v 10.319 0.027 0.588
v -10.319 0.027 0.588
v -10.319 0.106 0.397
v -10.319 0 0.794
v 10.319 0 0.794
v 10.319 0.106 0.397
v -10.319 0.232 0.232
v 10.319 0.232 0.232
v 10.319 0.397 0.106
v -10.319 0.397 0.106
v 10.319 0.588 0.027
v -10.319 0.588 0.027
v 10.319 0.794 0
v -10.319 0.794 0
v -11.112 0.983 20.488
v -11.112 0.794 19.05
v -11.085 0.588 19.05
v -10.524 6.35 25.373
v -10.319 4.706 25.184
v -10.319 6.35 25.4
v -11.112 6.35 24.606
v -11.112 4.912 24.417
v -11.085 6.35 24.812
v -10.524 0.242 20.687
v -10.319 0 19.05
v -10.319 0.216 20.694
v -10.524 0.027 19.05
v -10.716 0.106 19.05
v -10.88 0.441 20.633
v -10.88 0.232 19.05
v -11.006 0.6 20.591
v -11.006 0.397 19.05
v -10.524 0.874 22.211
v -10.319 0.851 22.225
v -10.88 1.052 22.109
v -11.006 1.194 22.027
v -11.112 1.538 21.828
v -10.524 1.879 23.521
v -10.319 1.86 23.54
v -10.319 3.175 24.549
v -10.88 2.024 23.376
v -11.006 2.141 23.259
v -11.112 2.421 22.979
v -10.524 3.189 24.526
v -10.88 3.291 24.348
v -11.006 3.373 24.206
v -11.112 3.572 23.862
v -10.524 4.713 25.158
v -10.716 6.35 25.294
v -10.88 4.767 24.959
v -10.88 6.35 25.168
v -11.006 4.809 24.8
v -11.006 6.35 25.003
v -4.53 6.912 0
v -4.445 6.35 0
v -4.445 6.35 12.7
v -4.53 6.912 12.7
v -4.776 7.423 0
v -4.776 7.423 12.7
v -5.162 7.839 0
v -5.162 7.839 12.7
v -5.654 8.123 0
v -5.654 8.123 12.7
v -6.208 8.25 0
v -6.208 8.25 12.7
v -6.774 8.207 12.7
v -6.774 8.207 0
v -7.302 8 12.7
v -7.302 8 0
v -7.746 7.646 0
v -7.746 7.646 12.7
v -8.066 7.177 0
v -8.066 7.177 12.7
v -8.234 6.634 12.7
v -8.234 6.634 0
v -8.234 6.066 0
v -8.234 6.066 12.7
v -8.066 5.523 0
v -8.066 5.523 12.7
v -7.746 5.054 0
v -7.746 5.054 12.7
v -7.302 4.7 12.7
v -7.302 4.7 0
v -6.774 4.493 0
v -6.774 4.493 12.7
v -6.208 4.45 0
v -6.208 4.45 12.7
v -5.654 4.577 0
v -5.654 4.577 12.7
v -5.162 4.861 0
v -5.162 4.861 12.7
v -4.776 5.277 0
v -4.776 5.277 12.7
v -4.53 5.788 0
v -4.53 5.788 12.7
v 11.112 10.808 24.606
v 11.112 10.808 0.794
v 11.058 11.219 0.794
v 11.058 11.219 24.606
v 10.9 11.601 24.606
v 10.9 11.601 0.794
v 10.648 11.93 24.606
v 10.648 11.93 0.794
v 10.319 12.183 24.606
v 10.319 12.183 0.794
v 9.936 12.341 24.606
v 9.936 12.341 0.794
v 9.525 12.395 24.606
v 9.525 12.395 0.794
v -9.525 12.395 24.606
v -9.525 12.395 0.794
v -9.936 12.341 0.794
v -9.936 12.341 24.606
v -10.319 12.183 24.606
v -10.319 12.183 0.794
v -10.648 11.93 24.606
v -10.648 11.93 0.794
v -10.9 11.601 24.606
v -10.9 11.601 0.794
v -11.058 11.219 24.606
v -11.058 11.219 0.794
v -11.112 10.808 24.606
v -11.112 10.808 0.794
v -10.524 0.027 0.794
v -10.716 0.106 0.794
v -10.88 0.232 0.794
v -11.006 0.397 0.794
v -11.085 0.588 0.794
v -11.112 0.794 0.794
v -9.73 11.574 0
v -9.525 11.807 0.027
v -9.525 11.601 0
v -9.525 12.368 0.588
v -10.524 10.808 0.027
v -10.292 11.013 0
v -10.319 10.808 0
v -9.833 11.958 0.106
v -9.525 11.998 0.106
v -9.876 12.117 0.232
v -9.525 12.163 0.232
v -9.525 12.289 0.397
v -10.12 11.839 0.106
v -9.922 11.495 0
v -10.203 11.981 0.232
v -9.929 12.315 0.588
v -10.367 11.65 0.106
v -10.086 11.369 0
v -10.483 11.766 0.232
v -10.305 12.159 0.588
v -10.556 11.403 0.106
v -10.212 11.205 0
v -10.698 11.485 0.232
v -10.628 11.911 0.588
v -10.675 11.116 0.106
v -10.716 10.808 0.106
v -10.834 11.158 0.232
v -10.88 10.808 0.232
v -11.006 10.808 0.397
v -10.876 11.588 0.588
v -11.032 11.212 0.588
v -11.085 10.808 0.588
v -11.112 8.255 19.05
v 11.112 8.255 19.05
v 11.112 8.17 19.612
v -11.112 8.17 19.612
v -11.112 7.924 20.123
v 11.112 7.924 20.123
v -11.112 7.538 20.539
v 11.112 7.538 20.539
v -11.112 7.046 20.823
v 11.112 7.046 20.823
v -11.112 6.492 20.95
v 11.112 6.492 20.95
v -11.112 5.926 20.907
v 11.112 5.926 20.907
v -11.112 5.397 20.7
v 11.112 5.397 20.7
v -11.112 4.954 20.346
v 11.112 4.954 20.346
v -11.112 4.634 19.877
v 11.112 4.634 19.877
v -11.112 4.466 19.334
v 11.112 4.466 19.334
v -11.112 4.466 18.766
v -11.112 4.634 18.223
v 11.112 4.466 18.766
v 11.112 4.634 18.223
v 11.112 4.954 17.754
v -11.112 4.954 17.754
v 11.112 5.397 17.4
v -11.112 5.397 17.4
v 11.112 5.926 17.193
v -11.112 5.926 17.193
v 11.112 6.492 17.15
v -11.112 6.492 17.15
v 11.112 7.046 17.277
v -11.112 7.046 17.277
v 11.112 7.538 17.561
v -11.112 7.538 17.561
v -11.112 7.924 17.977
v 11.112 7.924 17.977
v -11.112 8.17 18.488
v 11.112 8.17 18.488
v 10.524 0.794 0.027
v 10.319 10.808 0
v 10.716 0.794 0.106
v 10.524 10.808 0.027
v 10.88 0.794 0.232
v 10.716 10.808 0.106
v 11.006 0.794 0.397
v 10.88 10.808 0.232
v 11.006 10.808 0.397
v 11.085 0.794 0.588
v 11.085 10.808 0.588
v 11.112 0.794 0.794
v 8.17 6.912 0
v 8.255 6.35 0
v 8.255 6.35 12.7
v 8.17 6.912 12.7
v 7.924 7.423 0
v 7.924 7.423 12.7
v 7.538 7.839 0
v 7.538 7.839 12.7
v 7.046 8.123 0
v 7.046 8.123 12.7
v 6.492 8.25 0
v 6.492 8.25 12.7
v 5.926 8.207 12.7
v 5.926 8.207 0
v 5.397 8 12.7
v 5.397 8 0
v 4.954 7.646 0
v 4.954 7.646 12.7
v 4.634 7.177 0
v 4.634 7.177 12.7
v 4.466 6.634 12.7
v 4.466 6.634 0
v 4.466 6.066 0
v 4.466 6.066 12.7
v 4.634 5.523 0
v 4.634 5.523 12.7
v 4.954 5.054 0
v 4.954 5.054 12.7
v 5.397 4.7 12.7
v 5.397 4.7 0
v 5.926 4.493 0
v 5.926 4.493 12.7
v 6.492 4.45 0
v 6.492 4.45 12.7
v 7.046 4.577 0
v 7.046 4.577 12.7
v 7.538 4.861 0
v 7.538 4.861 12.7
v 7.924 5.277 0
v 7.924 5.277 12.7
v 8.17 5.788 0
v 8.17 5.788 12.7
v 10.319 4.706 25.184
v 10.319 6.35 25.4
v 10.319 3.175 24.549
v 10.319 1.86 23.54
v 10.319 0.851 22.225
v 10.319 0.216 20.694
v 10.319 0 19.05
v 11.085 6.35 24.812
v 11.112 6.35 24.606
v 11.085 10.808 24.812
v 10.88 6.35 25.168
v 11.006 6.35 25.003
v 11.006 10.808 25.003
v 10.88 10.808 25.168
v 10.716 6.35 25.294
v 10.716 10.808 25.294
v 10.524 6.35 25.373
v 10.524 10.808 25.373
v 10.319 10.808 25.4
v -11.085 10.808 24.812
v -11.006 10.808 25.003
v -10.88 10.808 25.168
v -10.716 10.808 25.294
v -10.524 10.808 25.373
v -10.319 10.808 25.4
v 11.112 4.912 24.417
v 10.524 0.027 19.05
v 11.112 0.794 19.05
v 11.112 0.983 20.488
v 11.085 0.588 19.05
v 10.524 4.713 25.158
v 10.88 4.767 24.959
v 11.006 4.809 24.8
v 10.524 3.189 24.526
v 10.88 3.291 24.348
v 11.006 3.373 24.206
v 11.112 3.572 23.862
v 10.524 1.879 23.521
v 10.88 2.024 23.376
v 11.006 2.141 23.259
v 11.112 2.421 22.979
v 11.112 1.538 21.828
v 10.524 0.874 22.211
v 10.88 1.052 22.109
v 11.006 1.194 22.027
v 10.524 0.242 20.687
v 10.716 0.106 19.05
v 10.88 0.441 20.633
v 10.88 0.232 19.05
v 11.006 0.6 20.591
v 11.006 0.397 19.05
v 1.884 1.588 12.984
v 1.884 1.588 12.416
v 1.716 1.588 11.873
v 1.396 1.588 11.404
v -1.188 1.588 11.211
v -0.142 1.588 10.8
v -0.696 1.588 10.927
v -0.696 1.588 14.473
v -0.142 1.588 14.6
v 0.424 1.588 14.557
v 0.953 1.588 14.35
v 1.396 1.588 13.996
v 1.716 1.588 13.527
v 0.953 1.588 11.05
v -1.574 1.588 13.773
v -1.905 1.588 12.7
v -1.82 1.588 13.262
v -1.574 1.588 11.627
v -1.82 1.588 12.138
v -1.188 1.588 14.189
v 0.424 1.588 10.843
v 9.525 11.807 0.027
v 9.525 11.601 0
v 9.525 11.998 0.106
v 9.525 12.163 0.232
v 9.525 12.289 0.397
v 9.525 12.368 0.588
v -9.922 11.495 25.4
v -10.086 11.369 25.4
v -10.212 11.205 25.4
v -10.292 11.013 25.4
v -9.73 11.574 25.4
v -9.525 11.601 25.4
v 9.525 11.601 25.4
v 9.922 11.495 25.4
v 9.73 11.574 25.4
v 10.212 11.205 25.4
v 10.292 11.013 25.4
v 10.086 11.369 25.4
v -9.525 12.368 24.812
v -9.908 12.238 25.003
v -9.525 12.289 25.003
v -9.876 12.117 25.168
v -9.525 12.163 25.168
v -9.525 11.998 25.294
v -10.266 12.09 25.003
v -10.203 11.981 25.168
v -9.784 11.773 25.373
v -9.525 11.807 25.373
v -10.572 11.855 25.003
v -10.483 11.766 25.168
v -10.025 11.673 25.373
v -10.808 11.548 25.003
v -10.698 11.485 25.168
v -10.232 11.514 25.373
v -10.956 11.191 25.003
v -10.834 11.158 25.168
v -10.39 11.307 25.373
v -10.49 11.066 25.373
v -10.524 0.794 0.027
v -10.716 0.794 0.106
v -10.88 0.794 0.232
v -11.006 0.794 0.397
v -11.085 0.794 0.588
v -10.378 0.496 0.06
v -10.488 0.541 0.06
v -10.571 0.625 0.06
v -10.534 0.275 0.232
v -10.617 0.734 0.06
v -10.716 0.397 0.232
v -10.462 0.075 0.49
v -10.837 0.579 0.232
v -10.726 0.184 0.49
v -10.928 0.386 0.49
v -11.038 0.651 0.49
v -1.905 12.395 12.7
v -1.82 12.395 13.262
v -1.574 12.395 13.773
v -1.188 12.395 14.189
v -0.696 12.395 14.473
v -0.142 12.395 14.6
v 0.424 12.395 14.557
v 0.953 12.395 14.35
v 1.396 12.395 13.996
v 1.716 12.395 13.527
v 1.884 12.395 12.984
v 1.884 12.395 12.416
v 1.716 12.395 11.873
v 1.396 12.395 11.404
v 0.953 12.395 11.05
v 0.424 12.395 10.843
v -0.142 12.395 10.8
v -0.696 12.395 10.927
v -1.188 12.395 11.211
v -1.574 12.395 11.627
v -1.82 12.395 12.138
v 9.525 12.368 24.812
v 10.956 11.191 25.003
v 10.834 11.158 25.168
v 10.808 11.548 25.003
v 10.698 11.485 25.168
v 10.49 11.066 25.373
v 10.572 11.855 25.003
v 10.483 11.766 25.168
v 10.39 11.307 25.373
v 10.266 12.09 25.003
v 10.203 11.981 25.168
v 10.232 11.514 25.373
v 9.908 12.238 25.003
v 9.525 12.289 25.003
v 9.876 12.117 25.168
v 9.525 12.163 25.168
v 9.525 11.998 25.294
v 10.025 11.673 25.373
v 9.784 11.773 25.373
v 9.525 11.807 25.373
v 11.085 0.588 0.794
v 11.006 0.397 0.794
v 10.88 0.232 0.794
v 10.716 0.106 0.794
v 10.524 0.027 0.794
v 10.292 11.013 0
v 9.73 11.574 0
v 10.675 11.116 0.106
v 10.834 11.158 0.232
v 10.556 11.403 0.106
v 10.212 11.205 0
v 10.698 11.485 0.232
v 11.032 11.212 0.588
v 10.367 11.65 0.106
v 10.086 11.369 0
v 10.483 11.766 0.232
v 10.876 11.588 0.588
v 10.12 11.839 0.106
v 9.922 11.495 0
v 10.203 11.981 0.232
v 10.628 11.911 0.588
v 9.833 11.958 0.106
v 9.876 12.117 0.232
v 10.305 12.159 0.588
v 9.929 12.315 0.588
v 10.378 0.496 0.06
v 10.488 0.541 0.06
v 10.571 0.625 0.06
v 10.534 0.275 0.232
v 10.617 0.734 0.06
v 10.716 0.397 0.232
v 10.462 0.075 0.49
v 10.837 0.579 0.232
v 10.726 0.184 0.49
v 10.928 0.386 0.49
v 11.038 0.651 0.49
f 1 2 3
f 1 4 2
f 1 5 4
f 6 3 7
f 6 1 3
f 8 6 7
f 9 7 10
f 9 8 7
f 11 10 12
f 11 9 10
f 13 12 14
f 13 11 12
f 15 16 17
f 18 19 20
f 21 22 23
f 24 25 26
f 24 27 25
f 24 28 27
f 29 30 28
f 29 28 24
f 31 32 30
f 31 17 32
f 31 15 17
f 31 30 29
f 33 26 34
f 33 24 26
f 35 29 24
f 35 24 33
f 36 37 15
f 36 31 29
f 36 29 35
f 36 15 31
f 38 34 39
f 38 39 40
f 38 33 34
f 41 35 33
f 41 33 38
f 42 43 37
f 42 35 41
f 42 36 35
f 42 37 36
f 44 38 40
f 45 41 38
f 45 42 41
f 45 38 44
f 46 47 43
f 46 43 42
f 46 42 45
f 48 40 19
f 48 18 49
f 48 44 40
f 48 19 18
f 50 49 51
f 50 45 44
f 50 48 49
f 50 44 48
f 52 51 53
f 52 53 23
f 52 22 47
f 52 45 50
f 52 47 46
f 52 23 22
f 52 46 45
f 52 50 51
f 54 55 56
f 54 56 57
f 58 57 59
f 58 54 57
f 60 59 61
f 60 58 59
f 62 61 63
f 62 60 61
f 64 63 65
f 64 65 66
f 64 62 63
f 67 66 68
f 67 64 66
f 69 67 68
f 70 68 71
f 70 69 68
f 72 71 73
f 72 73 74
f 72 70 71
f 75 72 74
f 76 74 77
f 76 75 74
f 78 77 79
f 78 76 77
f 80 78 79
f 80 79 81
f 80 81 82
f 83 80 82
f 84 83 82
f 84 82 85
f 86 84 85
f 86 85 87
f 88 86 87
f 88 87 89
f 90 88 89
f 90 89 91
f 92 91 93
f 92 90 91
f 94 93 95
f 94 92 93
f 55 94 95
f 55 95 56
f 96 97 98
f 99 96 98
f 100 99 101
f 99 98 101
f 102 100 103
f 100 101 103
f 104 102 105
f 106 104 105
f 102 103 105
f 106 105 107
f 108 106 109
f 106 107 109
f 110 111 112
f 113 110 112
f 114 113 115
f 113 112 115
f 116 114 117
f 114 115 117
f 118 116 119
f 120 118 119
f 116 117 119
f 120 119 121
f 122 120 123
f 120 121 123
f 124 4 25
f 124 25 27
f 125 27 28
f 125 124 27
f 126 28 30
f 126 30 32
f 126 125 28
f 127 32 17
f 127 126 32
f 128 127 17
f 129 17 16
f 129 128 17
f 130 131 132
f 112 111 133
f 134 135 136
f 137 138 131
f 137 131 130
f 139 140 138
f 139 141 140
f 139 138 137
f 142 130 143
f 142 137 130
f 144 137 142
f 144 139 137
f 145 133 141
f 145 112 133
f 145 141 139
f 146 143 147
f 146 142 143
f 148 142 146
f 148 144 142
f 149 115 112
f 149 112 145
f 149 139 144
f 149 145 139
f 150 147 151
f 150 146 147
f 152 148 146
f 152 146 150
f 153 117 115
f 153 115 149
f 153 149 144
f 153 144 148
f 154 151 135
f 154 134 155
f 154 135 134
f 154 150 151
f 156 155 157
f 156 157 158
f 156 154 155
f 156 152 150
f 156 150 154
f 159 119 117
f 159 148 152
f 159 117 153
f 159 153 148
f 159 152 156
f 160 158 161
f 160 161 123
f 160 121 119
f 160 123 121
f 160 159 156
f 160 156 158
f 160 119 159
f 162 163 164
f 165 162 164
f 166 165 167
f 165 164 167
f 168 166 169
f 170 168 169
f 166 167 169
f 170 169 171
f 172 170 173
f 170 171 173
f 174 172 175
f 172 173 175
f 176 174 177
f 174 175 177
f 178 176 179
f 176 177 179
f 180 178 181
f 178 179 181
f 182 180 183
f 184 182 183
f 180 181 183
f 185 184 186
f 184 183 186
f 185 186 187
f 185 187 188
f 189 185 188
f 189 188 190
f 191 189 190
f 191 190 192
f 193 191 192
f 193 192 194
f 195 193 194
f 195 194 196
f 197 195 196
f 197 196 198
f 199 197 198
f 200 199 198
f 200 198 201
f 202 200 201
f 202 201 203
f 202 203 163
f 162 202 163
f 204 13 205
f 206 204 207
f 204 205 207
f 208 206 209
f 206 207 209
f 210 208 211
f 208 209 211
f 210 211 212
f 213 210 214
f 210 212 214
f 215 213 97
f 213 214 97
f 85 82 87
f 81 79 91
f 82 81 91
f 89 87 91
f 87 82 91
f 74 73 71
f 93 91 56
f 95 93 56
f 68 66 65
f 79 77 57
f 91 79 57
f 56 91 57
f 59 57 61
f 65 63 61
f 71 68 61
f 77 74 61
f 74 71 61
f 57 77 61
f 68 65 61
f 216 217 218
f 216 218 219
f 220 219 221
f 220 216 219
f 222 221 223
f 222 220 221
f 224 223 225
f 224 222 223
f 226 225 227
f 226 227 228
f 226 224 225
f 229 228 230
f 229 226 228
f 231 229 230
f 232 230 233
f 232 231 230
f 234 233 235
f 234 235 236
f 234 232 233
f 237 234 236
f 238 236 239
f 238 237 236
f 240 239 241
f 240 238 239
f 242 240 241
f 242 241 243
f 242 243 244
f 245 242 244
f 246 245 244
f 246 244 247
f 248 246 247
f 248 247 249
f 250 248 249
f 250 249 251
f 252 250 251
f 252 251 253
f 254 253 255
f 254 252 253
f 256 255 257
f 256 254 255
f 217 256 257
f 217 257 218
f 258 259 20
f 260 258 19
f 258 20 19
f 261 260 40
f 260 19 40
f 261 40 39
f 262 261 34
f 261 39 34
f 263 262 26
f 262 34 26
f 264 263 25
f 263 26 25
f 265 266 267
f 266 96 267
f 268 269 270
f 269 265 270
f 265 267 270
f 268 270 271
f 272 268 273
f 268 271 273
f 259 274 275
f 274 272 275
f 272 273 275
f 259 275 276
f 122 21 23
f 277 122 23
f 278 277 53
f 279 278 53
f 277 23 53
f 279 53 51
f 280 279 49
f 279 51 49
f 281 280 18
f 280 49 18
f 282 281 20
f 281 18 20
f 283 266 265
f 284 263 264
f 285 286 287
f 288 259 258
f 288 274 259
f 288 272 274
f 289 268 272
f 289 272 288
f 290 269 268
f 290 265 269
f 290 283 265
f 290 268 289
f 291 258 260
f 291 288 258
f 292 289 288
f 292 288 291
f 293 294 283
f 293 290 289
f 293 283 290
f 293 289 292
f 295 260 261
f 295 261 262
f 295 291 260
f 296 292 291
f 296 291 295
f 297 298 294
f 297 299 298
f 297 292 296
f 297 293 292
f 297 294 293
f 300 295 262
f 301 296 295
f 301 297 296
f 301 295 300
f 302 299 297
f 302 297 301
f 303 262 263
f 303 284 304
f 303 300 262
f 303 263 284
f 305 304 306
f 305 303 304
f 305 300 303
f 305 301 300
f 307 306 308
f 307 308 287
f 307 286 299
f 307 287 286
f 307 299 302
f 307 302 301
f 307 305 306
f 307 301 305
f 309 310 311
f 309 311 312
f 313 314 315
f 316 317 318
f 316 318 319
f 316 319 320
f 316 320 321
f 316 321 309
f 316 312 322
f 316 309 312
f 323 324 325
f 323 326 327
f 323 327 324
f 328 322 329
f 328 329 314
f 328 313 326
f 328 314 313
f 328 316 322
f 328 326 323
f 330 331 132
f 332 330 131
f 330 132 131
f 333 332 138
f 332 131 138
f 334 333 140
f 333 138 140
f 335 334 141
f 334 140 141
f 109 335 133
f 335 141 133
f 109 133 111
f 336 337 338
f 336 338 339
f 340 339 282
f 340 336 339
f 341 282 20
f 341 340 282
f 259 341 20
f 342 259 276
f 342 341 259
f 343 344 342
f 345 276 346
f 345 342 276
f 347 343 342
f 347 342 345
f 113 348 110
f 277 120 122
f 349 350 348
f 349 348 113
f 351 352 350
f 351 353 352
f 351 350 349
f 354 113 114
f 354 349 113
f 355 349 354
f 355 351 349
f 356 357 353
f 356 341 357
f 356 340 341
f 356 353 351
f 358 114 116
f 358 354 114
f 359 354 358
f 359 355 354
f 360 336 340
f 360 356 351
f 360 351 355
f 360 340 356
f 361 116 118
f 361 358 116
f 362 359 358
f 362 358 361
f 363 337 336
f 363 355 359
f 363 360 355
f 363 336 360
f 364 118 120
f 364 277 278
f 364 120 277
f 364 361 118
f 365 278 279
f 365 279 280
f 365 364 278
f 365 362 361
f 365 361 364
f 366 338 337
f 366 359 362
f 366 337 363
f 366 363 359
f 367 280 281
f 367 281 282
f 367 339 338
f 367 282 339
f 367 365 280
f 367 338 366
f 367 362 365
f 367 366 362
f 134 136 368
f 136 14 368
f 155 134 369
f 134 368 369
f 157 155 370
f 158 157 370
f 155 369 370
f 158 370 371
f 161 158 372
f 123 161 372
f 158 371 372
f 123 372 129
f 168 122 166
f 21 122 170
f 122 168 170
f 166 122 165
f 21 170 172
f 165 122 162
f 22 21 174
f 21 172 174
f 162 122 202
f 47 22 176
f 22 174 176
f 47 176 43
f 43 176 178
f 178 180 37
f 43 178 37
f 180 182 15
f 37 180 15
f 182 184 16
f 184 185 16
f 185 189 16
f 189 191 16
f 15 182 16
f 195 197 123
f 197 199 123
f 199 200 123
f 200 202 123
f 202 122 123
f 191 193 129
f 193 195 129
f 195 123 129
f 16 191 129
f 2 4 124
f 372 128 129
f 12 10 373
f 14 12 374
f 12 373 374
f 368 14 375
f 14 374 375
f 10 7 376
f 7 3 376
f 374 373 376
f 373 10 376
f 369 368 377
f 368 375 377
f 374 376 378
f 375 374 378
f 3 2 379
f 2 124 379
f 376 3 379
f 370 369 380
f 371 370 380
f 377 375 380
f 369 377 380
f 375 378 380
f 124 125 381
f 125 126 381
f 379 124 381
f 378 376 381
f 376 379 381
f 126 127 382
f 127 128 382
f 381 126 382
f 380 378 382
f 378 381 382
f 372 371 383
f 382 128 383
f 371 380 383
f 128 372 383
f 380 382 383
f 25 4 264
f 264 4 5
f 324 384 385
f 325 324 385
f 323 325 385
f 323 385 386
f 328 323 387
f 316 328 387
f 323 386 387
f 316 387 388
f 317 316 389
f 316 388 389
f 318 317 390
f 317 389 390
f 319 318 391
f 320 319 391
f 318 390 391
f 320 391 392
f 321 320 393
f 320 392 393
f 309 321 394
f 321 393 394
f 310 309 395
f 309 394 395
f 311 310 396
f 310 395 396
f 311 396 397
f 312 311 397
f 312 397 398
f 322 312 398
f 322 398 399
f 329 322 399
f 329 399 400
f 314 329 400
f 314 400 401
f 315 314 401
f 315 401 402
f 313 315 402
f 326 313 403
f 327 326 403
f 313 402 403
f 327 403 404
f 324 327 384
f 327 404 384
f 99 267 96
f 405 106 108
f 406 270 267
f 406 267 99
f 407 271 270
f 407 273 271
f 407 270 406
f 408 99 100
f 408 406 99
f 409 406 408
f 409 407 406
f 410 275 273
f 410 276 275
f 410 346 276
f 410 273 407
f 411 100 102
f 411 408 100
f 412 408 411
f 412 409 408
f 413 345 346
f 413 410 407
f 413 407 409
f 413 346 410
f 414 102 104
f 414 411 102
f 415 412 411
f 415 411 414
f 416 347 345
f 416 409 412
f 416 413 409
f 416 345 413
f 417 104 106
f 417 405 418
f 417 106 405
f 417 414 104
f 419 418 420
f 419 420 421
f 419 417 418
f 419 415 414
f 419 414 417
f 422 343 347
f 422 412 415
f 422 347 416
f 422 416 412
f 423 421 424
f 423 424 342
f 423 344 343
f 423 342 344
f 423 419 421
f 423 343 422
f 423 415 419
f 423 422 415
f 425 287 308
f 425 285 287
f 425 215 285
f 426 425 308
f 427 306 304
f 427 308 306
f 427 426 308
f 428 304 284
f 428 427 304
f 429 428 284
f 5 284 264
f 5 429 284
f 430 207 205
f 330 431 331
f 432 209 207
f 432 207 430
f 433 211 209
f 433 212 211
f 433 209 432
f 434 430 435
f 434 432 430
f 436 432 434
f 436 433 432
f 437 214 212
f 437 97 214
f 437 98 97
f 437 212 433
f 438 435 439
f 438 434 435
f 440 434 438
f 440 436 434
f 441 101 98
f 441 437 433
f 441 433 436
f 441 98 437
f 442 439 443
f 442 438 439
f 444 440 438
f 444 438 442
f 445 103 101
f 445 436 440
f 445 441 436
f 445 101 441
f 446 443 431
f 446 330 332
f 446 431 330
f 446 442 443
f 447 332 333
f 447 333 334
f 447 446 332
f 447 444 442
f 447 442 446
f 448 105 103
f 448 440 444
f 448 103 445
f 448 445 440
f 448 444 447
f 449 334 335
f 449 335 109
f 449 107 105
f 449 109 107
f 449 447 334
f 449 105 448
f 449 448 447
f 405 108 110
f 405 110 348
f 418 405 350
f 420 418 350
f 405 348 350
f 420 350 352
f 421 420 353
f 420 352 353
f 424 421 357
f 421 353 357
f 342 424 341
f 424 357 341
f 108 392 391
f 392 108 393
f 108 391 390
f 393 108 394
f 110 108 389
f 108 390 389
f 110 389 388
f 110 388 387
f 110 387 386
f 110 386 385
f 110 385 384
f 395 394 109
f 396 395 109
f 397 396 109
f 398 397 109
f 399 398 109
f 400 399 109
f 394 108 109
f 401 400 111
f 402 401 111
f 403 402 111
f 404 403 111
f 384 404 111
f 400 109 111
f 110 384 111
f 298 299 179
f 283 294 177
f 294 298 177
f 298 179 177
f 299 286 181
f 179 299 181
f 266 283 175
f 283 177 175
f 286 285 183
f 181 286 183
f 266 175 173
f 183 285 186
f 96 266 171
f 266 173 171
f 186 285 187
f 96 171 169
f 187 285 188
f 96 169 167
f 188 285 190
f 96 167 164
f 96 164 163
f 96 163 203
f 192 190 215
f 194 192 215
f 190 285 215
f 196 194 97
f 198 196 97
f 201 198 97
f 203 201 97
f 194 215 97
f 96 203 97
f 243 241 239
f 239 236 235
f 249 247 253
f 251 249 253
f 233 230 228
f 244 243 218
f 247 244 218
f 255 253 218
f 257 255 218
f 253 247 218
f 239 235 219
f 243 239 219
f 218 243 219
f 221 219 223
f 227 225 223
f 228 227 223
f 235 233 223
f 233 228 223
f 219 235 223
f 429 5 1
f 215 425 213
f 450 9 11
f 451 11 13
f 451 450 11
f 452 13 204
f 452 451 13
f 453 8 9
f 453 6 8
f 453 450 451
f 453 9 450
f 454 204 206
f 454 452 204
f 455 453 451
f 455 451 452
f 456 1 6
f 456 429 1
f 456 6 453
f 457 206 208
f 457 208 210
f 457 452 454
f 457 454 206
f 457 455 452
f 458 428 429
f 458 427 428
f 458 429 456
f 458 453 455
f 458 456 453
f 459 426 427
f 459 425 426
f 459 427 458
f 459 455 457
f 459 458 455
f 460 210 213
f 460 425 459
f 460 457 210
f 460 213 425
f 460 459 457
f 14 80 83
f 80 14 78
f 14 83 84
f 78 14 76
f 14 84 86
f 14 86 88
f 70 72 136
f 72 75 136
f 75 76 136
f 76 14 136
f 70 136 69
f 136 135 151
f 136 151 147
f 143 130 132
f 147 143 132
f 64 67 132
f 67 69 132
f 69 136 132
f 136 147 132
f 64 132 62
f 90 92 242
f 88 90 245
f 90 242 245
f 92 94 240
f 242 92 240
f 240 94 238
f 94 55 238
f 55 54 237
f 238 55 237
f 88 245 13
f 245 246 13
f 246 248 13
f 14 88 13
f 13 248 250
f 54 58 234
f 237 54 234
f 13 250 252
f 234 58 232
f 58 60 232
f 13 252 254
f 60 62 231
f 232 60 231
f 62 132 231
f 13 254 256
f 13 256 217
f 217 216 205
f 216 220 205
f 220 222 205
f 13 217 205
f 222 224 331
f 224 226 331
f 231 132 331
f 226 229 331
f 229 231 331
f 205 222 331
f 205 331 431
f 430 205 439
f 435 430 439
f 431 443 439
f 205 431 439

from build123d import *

# Parameters (mm, degrees)
SKETCH1_R           = 1.905
BOSS_EXTRUDE1_DEPTH = 12.7
BOSS_EXTRUDE2_DEPTH = 12.7
CUT_EXTRUDE1_REACH  = 37.955
SKETCH3_R           = 1.905
SKETCH4_R           = 1.905
CUT_EXTRUDE2_DEPTH  = 10.8077
FILLET1_R           = 0.79375
FILLET2_R           = 6.35


with BuildPart() as part:
    # Sketch1 → Boss-Extrude1 (new body)
    with BuildSketch(Plane.XY):
        with BuildLine():
            Line((-11.1125, 0), (11.1125, 0))
            Line((11.1125, 0), (11.1125, 10.8077))
            ThreePointArc((11.1125, 10.8077), (10.647532015, 11.930232015), (9.525, 12.3952))
            Line((9.525, 12.3952), (-9.525, 12.3952))
            ThreePointArc((-9.525, 12.3952), (-10.647532015, 11.930232015), (-11.1125, 10.8077))
            Line((-11.1125, 10.8077), (-11.1125, 0))
        make_face()
        with Locations((-6.35, 6.35)):
            Circle(SKETCH1_R, mode=Mode.SUBTRACT)
        with Locations((6.35, 6.35)):
            Circle(SKETCH1_R, mode=Mode.SUBTRACT)
    extrude(amount=BOSS_EXTRUDE1_DEPTH)

    # Sketch2 → Boss-Extrude2 (add)
    with BuildSketch(Plane.XY.offset(12.7)):
        with BuildLine():
            Line((11.1125, 0), (11.1125, 10.8077))
            ThreePointArc((11.1125, 10.8077), (10.647532015, 11.930232015), (9.525, 12.3952))
            Line((9.525, 12.3952), (-9.525, 12.3952))
            ThreePointArc((-9.525, 12.3952), (-10.647532015, 11.930232015), (-11.1125, 10.8077))
            Line((-11.1125, 10.8077), (-11.1125, 0))
            Line((-11.1125, 0), (11.1125, 0))
        make_face()
    extrude(amount=BOSS_EXTRUDE2_DEPTH)

    # Sketch3 → Cut-Extrude1 (cut, up to next)
    with BuildSketch(Plane(origin=(11.1125, 0, 0), x_dir=(0, 0, -1), z_dir=(1, 0, 0)), mode=Mode.PRIVATE) as cut_extrude1_sk1:
        with Locations(Location((-19.05, 6.35, 0), (0, 0, 90))):
            Circle(SKETCH3_R)
    cut_extrude1_tool1 = extrude(cut_extrude1_sk1.sketch, amount=-CUT_EXTRUDE1_REACH, mode=Mode.PRIVATE) & part.part
    add(cut_extrude1_tool1.solids().sort_by_distance((11.1125, 6.35, 19.05))[0], mode=Mode.SUBTRACT)

    # Sketch4 → Cut-Extrude2 (cut)
    with BuildSketch(Plane(origin=(0, 12.3952, 0), x_dir=(1, 0, 0), z_dir=(0, 1, 0))):
        with Locations(Location((0, -12.7, 0), (0, 0, 180))):
            Circle(SKETCH4_R)
    extrude(amount=-CUT_EXTRUDE2_DEPTH, mode=Mode.SUBTRACT)

    # Fillet1
    fillet1_edges = [part.edges().sort_by_distance(p)[0] for p in [
        (11.1125, 0, 12.7),
        (-11.1125, 0, 12.7),
        (11.1125, 5.40385, 25.4),
        (10.647532015, 11.930232015, 25.4),
        (0, 12.3952, 25.4),
        (-10.647532015, 11.930232015, 25.4),
        (-11.1125, 5.40385, 25.4),
        (0, 0, 0),
        (-11.1125, 5.40385, 0),
        (-10.647532015, 11.930232015, 0),
        (0, 12.3952, 0),
        (10.647532015, 11.930232015, 0),
        (11.1125, 5.40385, 0),
    ]]
    fillet(fillet1_edges, radius=FILLET1_R)

    # Fillet2
    # the kernel refuses this fillet: 6.35 mm, written as the material it takes off along each edge
    with BuildSketch(Plane(origin=(-11.1125, 6.35, 19.05), x_dir=(0, -1, 0), z_dir=(0, 0, -1))) as fillet2_piece_1:
        with BuildLine():
            CenterArc((5.55625, -0.79375), 0.79375, 0, 90)
            Line((6.35, -0.79375), (6.35, 0))
            Line((6.35, 0), (5.55625, 0))
        make_face()
    revolve(axis=Axis((-11.1125, 6.35, 19.05), (-1, 0, 0)), revolution_arc=90, mode=Mode.SUBTRACT)
    with BuildSketch(Plane(origin=(11.1125, 6.35, 19.05), x_dir=(0, 0, 1), z_dir=(0, 1, 0))) as fillet2_piece_2:
        with BuildLine():
            CenterArc((5.55625, -0.79375), 0.79375, 0, 90)
            Line((6.35, -0.79375), (6.35, 0))
            Line((6.35, 0), (5.55625, 0))
        make_face()
    revolve(axis=Axis((11.1125, 6.35, 19.05), (1, 0, 0)), revolution_arc=90, mode=Mode.SUBTRACT)
    with BuildSketch(Plane(origin=(-11.1125, 0, 25.4), x_dir=(0, 0, -1), z_dir=(1, 0, 0))) as fillet2_piece_3:
        with BuildLine():
            CenterArc((FILLET2_R, FILLET2_R), FILLET2_R, 180, 90)
            Line((0, FILLET2_R), (0, 0))
            Line((0, 0), (FILLET2_R, 0))
        make_face()
    extrude(amount=22.225, mode=Mode.SUBTRACT)


solid = part.part
